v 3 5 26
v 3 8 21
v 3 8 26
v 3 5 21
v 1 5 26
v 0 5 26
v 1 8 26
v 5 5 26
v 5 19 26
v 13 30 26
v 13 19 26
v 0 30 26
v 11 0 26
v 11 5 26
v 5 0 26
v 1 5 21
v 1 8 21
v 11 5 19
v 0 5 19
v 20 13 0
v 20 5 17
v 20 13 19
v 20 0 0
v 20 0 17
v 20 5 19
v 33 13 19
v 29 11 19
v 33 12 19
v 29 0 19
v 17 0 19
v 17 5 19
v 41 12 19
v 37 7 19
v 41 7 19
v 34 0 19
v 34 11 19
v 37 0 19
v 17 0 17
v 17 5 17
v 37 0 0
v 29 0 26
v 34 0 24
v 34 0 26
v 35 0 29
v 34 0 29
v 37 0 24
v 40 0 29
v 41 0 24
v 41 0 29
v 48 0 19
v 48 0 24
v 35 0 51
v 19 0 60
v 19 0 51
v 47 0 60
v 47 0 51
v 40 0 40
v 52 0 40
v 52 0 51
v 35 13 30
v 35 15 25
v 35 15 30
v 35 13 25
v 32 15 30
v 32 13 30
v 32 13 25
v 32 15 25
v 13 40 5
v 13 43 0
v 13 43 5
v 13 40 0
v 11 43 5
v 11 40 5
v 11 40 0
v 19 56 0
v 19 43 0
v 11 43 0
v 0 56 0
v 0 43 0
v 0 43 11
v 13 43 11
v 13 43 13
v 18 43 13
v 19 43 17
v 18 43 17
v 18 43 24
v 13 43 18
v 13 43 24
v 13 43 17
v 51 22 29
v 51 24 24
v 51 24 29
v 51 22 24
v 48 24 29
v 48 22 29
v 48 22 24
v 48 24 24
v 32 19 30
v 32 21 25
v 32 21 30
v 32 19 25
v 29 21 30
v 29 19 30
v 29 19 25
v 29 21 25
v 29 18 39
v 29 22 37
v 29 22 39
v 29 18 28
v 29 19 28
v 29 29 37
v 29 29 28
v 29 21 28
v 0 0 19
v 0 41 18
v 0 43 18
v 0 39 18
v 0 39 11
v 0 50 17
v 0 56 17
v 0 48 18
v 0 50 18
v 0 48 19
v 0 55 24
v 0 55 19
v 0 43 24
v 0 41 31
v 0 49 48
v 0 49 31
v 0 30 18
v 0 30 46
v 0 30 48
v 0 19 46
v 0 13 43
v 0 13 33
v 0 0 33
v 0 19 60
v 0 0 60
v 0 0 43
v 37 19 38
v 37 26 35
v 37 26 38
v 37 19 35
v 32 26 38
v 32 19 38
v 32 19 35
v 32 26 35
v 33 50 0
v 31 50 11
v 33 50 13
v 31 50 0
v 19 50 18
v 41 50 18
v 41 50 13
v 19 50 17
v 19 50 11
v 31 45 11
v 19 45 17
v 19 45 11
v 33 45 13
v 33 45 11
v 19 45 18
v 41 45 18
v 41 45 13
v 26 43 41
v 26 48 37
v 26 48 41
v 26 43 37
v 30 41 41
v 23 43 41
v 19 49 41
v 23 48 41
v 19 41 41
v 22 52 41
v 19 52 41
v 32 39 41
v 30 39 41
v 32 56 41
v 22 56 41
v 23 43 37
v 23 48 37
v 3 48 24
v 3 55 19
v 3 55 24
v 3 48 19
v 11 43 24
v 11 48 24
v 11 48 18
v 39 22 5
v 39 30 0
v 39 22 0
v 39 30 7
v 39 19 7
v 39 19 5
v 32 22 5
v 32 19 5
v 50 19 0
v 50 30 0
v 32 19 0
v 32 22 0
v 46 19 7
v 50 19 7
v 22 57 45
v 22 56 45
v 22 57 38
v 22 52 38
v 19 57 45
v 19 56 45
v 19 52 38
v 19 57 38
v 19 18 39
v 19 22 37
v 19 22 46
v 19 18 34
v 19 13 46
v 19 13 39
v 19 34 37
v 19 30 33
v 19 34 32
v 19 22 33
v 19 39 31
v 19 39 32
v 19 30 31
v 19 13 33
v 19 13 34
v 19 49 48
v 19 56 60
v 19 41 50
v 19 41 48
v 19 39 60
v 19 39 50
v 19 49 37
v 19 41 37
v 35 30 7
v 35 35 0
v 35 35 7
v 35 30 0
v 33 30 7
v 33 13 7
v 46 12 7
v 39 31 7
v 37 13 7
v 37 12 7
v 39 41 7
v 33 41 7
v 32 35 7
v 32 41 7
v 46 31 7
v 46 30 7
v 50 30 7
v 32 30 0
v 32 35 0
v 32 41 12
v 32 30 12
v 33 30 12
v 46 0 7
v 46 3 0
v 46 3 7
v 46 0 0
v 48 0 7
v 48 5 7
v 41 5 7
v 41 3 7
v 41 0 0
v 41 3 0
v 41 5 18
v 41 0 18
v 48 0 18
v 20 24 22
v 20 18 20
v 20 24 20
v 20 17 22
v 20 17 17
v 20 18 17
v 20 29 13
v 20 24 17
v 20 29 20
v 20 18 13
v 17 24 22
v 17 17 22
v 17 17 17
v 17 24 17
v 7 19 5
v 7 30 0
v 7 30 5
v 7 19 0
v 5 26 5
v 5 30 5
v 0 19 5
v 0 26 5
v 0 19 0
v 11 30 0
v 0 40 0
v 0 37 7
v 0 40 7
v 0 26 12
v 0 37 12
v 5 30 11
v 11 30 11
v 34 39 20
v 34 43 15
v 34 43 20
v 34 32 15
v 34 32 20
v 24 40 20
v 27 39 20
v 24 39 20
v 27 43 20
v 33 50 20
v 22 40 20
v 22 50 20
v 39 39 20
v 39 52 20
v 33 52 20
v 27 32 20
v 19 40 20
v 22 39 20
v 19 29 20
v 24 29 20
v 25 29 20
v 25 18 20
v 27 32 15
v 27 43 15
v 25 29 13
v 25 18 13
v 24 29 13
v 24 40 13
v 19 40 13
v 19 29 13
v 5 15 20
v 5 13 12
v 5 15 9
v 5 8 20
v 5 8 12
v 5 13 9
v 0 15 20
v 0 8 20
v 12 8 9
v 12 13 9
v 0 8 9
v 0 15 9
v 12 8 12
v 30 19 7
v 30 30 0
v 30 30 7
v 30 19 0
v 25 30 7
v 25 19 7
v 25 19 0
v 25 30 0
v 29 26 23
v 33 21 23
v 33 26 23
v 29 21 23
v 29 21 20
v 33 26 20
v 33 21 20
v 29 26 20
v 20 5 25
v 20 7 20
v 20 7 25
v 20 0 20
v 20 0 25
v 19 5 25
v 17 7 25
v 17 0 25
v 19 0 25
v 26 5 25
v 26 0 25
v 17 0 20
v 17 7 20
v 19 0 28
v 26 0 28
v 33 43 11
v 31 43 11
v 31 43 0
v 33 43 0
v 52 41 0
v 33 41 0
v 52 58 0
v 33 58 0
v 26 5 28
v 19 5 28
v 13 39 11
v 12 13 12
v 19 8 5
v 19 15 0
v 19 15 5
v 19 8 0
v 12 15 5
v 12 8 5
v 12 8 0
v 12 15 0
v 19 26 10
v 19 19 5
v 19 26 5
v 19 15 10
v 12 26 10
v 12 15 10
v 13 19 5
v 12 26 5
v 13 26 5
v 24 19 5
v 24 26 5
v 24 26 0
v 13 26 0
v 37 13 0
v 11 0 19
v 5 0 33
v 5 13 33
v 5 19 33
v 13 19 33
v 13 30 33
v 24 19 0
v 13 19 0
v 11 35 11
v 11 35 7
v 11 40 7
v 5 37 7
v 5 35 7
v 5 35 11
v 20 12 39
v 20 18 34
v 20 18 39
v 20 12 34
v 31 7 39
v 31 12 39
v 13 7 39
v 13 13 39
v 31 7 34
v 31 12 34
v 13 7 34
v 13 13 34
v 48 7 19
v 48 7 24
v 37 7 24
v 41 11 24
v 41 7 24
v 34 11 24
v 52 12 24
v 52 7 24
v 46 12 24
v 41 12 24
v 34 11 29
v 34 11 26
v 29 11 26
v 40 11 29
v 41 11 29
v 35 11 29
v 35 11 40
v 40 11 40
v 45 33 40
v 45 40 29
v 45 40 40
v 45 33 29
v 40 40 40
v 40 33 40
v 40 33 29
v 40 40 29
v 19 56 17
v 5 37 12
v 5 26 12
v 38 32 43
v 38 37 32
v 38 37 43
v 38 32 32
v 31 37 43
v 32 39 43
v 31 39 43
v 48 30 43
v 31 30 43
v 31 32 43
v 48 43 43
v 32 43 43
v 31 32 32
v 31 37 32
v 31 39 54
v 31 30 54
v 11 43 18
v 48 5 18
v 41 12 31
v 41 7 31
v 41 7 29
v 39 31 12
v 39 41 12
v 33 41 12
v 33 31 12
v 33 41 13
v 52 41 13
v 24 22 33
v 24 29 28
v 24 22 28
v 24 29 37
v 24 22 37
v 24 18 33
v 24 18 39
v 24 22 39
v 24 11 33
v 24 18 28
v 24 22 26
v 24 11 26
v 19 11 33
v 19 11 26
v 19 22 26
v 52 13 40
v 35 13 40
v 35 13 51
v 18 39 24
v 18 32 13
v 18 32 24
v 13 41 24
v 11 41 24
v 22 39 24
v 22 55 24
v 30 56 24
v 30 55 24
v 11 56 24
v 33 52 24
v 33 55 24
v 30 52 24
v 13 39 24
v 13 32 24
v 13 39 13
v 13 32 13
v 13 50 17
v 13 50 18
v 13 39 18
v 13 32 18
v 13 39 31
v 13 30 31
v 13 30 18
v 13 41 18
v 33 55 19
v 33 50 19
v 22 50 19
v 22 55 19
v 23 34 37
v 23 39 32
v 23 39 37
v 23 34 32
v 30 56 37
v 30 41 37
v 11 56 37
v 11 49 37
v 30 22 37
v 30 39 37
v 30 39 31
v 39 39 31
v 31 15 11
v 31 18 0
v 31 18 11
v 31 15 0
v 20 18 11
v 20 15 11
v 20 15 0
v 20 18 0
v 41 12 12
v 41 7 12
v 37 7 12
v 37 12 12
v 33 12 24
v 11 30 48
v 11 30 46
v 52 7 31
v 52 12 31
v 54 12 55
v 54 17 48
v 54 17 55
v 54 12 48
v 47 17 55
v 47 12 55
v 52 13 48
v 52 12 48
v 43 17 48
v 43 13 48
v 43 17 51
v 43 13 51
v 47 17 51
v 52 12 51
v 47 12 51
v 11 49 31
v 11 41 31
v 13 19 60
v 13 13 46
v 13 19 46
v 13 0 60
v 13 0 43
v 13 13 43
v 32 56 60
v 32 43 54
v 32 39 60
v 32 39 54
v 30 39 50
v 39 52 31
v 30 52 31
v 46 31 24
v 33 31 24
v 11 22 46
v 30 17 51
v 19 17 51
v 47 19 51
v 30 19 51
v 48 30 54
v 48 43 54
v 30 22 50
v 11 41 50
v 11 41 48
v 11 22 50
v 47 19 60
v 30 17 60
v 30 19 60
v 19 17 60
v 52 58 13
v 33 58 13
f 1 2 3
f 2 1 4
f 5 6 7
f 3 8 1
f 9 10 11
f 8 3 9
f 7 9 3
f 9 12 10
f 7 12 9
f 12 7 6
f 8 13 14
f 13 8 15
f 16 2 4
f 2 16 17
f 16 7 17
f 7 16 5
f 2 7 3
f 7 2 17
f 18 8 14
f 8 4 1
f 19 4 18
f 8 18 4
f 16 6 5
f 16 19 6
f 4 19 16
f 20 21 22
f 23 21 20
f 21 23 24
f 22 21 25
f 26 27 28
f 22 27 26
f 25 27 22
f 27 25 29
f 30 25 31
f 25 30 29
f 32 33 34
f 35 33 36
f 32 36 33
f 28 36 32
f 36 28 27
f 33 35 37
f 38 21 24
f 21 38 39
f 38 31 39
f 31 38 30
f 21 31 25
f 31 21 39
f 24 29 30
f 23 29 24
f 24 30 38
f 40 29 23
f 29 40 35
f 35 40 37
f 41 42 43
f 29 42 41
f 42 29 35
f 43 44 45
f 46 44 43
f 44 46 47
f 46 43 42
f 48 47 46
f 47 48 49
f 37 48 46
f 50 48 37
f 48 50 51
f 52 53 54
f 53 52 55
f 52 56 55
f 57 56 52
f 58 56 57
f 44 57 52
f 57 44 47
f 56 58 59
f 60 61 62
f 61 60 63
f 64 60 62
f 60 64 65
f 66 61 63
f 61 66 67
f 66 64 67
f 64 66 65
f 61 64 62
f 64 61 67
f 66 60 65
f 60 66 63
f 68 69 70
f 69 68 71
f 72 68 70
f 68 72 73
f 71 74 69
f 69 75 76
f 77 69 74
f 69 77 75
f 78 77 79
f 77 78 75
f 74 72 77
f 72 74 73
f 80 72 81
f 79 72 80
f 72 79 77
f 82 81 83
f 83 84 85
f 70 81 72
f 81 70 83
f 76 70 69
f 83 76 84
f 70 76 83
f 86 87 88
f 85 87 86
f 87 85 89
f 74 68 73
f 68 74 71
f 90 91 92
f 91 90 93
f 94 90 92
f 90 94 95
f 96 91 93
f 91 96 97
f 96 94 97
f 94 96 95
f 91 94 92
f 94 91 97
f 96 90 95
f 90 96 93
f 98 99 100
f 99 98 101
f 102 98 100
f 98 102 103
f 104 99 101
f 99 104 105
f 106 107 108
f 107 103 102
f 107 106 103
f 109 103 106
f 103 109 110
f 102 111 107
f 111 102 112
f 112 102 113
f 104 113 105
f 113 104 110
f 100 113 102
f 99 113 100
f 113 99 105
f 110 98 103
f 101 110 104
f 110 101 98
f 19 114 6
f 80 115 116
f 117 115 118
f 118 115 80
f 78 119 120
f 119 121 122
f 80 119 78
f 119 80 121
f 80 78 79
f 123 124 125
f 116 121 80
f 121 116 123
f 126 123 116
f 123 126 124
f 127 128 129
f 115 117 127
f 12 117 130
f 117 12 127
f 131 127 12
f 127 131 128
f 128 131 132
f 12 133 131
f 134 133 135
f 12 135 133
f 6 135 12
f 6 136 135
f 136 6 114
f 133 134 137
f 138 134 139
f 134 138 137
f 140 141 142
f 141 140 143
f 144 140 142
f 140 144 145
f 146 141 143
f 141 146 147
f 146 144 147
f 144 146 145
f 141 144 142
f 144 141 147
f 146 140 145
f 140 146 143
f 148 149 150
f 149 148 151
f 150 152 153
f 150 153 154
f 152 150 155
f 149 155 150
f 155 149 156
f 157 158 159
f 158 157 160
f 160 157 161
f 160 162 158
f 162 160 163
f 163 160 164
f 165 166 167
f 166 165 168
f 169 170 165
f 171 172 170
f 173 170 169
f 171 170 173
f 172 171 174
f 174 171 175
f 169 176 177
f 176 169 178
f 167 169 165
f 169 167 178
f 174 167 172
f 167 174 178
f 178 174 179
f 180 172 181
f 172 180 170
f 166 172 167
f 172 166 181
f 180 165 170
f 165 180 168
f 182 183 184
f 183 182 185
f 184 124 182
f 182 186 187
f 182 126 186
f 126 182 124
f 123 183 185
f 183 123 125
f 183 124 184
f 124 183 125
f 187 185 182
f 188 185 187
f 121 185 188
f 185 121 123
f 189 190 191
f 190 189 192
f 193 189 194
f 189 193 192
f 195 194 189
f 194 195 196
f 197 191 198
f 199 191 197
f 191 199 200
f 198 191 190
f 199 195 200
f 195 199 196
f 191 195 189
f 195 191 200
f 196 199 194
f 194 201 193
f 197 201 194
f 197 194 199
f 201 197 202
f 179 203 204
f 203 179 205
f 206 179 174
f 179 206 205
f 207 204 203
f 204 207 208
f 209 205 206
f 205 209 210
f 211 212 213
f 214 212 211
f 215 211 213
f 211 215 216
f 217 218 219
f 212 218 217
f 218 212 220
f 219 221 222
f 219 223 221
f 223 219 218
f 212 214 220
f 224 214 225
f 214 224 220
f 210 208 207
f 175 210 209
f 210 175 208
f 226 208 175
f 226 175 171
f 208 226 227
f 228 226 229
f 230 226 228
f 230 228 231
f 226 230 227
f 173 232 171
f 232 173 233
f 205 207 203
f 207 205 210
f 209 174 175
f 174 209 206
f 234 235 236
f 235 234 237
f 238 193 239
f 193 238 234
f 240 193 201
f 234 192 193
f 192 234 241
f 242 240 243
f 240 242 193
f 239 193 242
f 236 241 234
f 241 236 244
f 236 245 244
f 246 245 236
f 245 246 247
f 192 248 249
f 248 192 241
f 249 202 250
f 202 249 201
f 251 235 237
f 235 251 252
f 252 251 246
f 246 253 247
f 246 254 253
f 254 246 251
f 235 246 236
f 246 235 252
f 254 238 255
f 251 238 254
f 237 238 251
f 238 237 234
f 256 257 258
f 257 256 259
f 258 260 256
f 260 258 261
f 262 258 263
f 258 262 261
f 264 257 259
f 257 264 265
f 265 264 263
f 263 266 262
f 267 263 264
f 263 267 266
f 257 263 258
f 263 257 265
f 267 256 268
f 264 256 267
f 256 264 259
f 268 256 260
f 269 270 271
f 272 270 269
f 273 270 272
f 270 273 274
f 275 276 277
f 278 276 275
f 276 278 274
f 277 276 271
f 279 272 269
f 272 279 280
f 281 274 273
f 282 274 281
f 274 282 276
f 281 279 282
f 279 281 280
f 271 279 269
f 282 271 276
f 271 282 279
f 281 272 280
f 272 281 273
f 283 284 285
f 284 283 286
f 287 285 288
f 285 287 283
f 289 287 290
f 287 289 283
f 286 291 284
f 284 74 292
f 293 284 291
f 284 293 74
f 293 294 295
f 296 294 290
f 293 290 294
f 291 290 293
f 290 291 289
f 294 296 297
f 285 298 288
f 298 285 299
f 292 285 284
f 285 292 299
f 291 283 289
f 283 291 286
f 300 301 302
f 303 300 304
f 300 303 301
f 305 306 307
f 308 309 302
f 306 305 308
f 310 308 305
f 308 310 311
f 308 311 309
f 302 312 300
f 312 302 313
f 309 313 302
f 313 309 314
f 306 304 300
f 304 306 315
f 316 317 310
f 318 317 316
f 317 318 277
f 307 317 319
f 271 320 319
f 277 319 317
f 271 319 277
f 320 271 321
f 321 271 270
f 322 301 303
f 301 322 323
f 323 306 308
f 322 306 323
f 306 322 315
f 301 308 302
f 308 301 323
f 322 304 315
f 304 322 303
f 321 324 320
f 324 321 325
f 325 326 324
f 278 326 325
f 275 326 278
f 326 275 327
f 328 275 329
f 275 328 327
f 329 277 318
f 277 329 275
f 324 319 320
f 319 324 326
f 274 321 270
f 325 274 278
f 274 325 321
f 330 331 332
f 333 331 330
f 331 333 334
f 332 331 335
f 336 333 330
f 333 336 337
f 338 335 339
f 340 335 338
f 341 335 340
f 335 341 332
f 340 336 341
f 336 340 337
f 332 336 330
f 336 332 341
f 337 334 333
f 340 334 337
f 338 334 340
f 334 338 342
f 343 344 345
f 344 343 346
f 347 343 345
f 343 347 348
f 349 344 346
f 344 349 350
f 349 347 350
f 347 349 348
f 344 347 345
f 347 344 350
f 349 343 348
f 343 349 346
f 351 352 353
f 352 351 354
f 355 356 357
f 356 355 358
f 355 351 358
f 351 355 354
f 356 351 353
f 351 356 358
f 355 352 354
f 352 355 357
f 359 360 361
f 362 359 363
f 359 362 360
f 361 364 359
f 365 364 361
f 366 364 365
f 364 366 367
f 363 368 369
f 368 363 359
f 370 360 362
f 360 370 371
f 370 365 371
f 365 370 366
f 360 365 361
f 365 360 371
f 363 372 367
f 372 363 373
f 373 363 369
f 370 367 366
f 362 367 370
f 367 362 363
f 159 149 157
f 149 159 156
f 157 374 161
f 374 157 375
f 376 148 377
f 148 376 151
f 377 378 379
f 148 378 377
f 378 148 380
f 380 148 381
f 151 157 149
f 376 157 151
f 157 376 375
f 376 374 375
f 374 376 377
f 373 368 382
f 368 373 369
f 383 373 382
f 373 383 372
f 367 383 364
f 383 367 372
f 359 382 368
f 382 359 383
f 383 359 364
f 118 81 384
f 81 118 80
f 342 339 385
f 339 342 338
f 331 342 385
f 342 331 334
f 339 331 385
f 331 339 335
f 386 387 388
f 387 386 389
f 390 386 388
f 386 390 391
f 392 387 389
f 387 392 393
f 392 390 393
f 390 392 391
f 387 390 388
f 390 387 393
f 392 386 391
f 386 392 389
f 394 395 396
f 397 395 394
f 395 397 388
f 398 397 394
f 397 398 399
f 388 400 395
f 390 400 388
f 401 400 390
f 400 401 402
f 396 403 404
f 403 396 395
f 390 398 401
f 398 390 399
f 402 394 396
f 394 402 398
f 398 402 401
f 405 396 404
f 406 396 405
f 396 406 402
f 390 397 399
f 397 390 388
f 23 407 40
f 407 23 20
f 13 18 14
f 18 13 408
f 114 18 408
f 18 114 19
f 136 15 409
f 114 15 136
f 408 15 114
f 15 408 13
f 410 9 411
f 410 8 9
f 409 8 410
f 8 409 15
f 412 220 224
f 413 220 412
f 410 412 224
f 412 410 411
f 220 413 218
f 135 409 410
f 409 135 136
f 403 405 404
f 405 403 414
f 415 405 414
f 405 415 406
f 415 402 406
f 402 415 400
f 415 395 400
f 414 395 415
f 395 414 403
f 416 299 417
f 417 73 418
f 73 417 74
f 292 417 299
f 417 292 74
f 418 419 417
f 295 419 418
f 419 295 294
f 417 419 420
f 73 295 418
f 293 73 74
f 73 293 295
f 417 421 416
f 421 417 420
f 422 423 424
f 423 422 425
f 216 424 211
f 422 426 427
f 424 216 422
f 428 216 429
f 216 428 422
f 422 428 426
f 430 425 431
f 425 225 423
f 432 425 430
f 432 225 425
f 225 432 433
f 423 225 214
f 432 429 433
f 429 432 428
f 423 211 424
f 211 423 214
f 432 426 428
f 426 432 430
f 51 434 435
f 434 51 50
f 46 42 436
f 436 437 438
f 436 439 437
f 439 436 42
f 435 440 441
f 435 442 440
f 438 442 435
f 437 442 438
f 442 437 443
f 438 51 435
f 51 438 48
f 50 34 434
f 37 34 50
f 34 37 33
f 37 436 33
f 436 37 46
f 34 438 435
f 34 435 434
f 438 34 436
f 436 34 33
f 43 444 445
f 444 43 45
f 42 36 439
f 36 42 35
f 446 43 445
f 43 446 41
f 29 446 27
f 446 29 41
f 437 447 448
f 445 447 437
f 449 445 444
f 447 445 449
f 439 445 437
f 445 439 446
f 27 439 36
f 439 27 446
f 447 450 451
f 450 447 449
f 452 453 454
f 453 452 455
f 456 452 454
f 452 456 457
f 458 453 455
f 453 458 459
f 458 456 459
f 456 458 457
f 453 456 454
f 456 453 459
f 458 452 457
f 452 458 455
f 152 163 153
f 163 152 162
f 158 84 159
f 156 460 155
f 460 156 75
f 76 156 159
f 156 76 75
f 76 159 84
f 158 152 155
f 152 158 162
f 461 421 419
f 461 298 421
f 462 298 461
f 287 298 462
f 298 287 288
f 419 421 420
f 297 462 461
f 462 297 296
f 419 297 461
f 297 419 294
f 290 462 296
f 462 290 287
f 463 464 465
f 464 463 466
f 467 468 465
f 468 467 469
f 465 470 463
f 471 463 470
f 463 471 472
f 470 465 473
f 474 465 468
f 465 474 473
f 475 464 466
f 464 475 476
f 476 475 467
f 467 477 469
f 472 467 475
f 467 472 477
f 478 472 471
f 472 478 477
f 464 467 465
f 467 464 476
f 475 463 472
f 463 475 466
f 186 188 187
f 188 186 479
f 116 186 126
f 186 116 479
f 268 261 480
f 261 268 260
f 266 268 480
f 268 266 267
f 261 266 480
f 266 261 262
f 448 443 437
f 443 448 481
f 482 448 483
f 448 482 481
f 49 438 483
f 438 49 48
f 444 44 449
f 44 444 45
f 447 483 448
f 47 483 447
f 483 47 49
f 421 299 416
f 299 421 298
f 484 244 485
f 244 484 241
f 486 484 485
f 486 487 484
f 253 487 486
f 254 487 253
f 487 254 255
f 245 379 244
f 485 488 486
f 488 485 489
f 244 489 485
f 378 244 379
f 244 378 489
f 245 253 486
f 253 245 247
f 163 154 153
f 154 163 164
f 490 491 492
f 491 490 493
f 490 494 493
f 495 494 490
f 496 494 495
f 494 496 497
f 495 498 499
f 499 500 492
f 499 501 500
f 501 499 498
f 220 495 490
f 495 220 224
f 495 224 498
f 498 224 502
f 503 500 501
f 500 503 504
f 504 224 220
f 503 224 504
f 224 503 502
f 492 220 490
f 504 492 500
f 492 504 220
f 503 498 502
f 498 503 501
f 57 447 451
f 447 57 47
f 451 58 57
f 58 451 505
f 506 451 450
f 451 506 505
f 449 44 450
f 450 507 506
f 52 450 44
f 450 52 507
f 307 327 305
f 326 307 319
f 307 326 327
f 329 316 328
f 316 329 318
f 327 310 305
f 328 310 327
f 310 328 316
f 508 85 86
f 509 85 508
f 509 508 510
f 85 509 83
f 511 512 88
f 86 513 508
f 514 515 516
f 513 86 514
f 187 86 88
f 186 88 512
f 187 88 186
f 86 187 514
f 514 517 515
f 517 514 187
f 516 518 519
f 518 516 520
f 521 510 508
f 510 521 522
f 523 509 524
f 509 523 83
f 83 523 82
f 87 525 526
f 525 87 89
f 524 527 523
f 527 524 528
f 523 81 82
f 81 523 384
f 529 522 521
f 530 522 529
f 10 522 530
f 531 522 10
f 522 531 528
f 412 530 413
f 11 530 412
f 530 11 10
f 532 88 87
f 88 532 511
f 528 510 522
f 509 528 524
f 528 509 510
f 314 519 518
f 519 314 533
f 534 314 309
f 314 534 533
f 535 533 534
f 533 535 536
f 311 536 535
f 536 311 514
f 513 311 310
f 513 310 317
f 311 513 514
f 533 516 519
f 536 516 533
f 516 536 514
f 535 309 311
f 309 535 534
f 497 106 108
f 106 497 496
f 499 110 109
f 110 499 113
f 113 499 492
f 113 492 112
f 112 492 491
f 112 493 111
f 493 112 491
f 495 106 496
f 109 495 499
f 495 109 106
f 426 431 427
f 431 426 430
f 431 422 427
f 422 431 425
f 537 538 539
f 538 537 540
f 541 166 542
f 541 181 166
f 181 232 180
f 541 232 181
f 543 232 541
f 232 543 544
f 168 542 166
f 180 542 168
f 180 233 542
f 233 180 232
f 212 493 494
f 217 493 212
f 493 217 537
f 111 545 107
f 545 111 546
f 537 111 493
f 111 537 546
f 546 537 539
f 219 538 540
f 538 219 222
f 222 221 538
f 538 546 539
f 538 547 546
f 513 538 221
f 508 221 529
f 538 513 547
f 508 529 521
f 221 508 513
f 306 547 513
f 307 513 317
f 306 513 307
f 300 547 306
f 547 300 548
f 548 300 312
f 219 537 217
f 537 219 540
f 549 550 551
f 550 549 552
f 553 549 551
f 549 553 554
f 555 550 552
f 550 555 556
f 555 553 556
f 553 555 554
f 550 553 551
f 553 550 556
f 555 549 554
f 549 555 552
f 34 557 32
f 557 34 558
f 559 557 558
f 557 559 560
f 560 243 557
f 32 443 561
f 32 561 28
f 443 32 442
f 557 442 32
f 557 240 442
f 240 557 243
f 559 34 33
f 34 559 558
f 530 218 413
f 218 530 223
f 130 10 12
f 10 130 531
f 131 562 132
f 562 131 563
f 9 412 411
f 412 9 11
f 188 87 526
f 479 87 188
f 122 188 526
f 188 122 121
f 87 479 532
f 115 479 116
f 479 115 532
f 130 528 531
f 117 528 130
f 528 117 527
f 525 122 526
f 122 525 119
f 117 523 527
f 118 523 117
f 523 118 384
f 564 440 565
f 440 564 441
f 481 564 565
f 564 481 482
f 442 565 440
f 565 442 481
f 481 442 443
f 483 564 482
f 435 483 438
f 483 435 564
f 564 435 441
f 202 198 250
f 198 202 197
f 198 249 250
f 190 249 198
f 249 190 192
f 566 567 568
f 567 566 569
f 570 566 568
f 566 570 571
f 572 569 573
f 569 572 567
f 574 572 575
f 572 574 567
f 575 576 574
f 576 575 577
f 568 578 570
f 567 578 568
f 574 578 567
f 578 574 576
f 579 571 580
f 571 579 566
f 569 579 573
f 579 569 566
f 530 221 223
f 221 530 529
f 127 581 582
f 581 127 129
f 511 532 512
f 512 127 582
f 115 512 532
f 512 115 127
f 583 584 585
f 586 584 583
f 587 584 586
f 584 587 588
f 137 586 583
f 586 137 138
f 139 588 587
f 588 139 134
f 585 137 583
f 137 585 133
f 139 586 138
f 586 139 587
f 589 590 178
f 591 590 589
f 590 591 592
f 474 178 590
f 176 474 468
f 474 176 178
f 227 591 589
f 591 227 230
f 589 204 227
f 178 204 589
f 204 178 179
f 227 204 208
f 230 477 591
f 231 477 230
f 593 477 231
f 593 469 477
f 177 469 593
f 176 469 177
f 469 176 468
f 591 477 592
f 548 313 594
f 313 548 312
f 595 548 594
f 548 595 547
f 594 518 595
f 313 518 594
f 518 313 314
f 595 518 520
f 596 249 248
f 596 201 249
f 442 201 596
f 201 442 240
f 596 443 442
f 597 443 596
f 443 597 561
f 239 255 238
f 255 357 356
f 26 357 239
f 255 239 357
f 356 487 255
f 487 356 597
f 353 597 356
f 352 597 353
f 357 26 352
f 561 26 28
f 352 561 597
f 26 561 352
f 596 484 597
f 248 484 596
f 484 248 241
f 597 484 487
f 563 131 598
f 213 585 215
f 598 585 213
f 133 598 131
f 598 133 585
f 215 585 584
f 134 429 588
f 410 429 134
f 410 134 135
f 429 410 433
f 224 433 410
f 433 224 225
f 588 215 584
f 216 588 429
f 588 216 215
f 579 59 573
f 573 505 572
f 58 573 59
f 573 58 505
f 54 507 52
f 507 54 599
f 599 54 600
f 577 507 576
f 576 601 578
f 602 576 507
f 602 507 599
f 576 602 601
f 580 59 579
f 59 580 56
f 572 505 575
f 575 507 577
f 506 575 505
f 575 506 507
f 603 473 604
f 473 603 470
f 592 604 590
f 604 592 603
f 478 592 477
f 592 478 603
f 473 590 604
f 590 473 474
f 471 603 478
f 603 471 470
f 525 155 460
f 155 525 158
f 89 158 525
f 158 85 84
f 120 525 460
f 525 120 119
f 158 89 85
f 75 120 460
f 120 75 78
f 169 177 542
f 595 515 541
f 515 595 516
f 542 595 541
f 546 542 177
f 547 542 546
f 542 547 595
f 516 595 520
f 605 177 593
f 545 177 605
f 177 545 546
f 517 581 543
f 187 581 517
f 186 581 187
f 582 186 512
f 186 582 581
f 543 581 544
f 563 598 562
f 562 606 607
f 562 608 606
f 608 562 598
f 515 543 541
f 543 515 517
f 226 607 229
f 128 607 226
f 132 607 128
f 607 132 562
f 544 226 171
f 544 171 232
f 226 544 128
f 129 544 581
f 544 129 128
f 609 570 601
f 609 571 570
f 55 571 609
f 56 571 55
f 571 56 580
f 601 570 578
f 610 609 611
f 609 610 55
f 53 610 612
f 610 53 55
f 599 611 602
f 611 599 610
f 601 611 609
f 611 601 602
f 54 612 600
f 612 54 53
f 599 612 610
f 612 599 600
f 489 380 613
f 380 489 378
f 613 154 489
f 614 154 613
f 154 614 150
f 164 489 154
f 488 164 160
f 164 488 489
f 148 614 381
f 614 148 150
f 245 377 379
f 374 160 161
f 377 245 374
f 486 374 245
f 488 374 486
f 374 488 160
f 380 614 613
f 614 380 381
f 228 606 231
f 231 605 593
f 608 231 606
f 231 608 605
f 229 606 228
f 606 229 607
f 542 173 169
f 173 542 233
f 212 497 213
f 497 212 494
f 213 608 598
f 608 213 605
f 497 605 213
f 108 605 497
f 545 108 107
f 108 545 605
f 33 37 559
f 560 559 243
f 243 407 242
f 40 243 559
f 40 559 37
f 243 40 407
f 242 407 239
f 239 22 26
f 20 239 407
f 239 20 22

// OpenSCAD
translate([2.0, 6.5, 23.5]) color([0.38726457915960755, 0.18022138882203653, 0.8001465394041192]) cube([2, 3, 5], center=true);
translate([18.5, 2.5, 18.0]) color([0.8129994204848935, 0.08072942167368968, 0.17442535469903642]) cube([3, 5, 2], center=true);
translate([33.5, 14.0, 27.5]) color([0.26558344961408153, 0.8002006207478382, 0.3279381595582189]) cube([3, 2, 5], center=true);
translate([12.0, 41.5, 2.5]) color([0.7086727191051987, 0.7823295314553788, 0.5174360046946651]) cube([2, 3, 5], center=true);
translate([27.5, 51.0, 50.5]) color([0.45647885649310815, 0.9099967640280606, 0.7566722996545016]) cube([5, 2, 3], center=true);
translate([49.5, 23.0, 26.5]) color([0.44882496858184395, 0.15281911968142636, 0.6325441046469116]) cube([3, 2, 5], center=true);
translate([30.5, 20.0, 27.5]) color([0.1769660088535372, 0.5122224095001495, 0.8959696721858674]) cube([3, 2, 5], center=true);
translate([3.5, 52.5, 1.5]) color([0.31608020378500323, 0.9467436825606468, 0.1928870204716916]) cube([7, 5, 3], center=true);
translate([34.5, 22.5, 36.5]) color([0.7910187054913302, 0.6108926701450443, 0.8122678209742187]) cube([5, 7, 3], center=true);
translate([40.5, 47.5, 8.5]) color([0.5222627979471512, 0.7095307583634994, 0.9126687247694082]) cube([3, 5, 7], center=true);
translate([24.5, 45.5, 37.5]) color([0.13487625477079712, 0.7715208720856912, 0.05716454642595936]) cube([3, 5, 7], center=true);
translate([1.5, 51.5, 21.5]) color([0.08241654053773162, 0.5176706786705761, 0.0024604932439482585]) cube([3, 7, 5], center=true);
translate([35.5, 20.5, 2.5]) color([0.774865046739482, 0.10398133417765076, 0.6075408633971222]) cube([7, 3, 5], center=true);
translate([20.5, 54.5, 41.5]) color([0.5702741924791085, 0.335807396721168, 0.3780654483467295]) cube([3, 5, 7], center=true);
translate([33.5, 32.5, 3.5]) color([0.36205489178930694, 0.8413126085807436, 0.6365683683667089]) cube([3, 5, 7], center=true);
translate([43.5, 1.5, 3.5]) color([0.13610848275491239, 0.9255182446742467, 0.18259927432055334]) cube([5, 3, 7], center=true);
translate([45.5, 10.5, 44.5]) color([0.12509989752770068, 0.33788945440902196, 0.607477949510089]) cube([5, 3, 7], center=true);
translate([18.5, 20.5, 19.5]) color([0.04413950751599882, 0.6453929548117466, 0.6988419541065013]) cube([3, 7, 5], center=true);
translate([3.5, 24.5, 2.5]) color([0.7967664255910738, 0.9116718921976609, 0.600448770579328]) cube([7, 11, 5], center=true);
translate([30.5, 37.5, 17.5]) color([0.7944487907838055, 0.1681613799771936, 0.9183995562433641]) cube([7, 11, 5], center=true);
translate([22.5, 23.5, 16.5]) color([0.9268586566852167, 0.40822611044352053, 0.4407066729290805]) cube([5, 11, 7], center=true);
translate([2.5, 11.5, 14.5]) color([0.6041418306666712, 0.6201352905963935, 0.25582819932935885]) cube([5, 7, 11], center=true);
translate([27.5, 24.5, 3.5]) color([0.3097428572381714, 0.8490920052212889, 0.453637908490201]) cube([5, 11, 7], center=true);
translate([32.5, 23.5, 21.5]) color([0.18066627555108494, 0.4537290543496928, 0.2641493990309046]) cube([7, 5, 3], center=true);
translate([18.5, 3.5, 22.5]) color([0.9492851375614021, 0.06409274308092405, 0.09630522223834415]) cube([3, 7, 5], center=true);
translate([33.5, 46.5, 5.5]) color([0.02618666999626429, 0.02133712304448243, 0.40376331371079255]) cube([5, 7, 11], center=true);
translate([22.5, 2.5, 26.5]) color([0.6905719463038024, 0.8969992176715027, 0.32280326974746465]) cube([7, 5, 3], center=true);
translate([3.5, 48.5, 5.5]) color([0.790755737975632, 0.7460115169857665, 0.6948475129606672]) cube([7, 7, 11], center=true);
translate([9.5, 39.5, 35.5]) color([0.47653257906772517, 0.8579766307154586, 0.5356136848189613]) cube([5, 11, 7], center=true);
translate([8.5, 10.5, 10.5]) color([0.4019331618452773, 0.783713898498177, 0.9254696984756191]) cube([7, 5, 3], center=true);
translate([15.5, 11.5, 2.5]) color([0.0277966234683793, 0.5158650286176655, 0.8365998776746773]) cube([7, 7, 5], center=true);
translate([15.5, 20.5, 7.5]) color([0.08009244005093674, 0.35854963179787425, 0.0984859129144442]) cube([7, 11, 5], center=true);
translate([26.5, 2.5, 5.5]) color([0.9681463616569913, 0.1542718478221884, 0.5165971564168642]) cube([7, 5, 11], center=true);
translate([5.5, 2.5, 22.5]) color([0.8047430089643692, 0.9598305824160865, 0.0007265089205383823]) cube([11, 5, 7], center=true);
translate([2.5, 5.5, 29.5]) color([0.33769105491683293, 0.9444140087685011, 0.6959768172121321]) cube([5, 11, 7], center=true);
translate([18.5, 22.5, 2.5]) color([0.16055826227824588, 0.7793255516951493, 0.1589752259859445]) cube([11, 7, 5], center=true);
translate([5.5, 37.5, 3.5]) color([0.6798370424105331, 0.9431536263145228, 0.9341404857092784]) cube([11, 5, 7], center=true);
translate([16.5, 12.5, 36.5]) color([0.32827049453258017, 0.023848105094706917, 0.9585798448912861]) cube([7, 11, 5], center=true);
translate([42.5, 3.5, 21.5]) color([0.6258377632382796, 0.3981042954636257, 0.2264255750200933]) cube([11, 7, 5], center=true);
translate([2.5, 16.5, 29.5]) color([0.6356717667101055, 0.328569085672622, 0.9662245753272395]) cube([5, 11, 7], center=true);
translate([31.5, 5.5, 22.5]) color([0.3520821722301851, 0.16362135021644642, 0.42074777530803376]) cube([5, 11, 7], center=true);
translate([42.5, 36.5, 34.5]) color([0.36328644213461747, 0.5653807754665455, 0.3865100485452896]) cube([5, 7, 11], center=true);
translate([24.5, 47.5, 14.5]) color([0.7707594112565195, 0.16214085318372695, 0.5836514905515098]) cube([11, 5, 7], center=true);
translate([2.5, 31.5, 8.5]) color([0.6869400768720183, 0.718467099976435, 0.17196229100139104]) cube([5, 11, 7], center=true);
translate([34.5, 34.5, 37.5]) color([0.14887881293527583, 0.025166107893626943, 0.32332346968418324]) cube([7, 5, 11], center=true);
translate([5.5, 45.5, 20.5]) color([0.003696799562737496, 0.04720529747843194, 0.9255571895234466]) cube([11, 5, 7], center=true);
translate([44.5, 2.5, 12.5]) color([0.573001262631075, 0.14769469781462263, 0.15315209085934545]) cube([7, 5, 11], center=true);
translate([5.5, 45.5, 35.5]) color([0.7868491215994531, 0.7877029182496789, 0.4187372508366701]) cube([11, 5, 5], center=true);
translate([37.5, 5.5, 26.5]) color([0.5680438273675328, 0.6864311496386182, 0.7112052310106062]) cube([7, 11, 5], center=true);
translate([5.5, 32.5, 5.5]) color([0.9225367392437966, 0.36402675889620517, 0.21666285047939615]) cube([11, 5, 11], center=true);
translate([35.5, 35.5, 9.5]) color([0.40038769746607716, 0.12979762559949215, 0.5661089096865166]) cube([7, 11, 5], center=true);
translate([35.5, 47.5, 14.5]) color([0.350592866287013, 0.09655676358596321, 0.8957043173613797]) cube([11, 5, 7], center=true);
translate([21.5, 16.5, 29.5]) color([0.24564542972396286, 0.3817592950540295, 0.9163373365613642]) cube([5, 11, 7], center=true);
translate([37.5, 5.5, 34.5]) color([0.24005472395766314, 0.4811830401201487, 0.9204180358452778]) cube([5, 11, 11], center=true);
translate([21.5, 34.5, 16.5]) color([0.06901768472479497, 0.25236871091997304, 0.2758752397078251]) cube([5, 11, 7], center=true);
translate([15.5, 37.5, 18.5]) color([0.526585946767007, 0.5423400552699501, 0.6040332809955223]) cube([5, 11, 11], center=true);
translate([27.5, 52.5, 21.5]) color([0.7795947303962014, 0.8767515811101877, 0.27628184885013174]) cube([11, 5, 5], center=true);
translate([26.5, 23.5, 33.5]) color([0.6109665581700968, 0.8673330381368943, 0.39077563557117434]) cube([5, 11, 11], center=true);
translate([25.5, 9.5, 36.5]) color([0.6261021875341246, 0.5344719952169016, 0.8525626141482417]) cube([11, 5, 5], center=true);
translate([17.5, 36.5, 34.5]) color([0.1442072370162294, 0.39242938925918713, 0.7677442686337953]) cube([11, 5, 5], center=true);
translate([25.5, 16.5, 5.5]) color([0.7310024639236243, 0.976490023680837, 0.432956620488795]) cube([11, 3, 11], center=true);
translate([35.5, 9.5, 15.5]) color([0.10481875176128097, 0.4606863677813431, 0.461987586031698]) cube([11, 5, 7], center=true);
translate([6.5, 24.5, 29.5]) color([0.16960878923904732, 0.4743590683571708, 0.15900931947085895]) cube([13, 11, 7], center=true);
translate([6.5, 44.5, 14.5]) color([0.9184122383299332, 0.8645912802495788, 0.7618309073415613]) cube([13, 11, 7], center=true);
translate([46.5, 9.5, 27.5]) color([0.1125156501937501, 0.36828247715101237, 0.14269334546182144]) cube([11, 5, 7], center=true);
translate([44.5, 24.5, 3.5]) color([0.3576212954978014, 0.47267833076618404, 0.5187172796832821]) cube([11, 11, 7], center=true);
translate([48.5, 14.5, 51.5]) color([0.05390524264941354, 0.8771386739413267, 0.25763233882857706]) cube([11, 5, 7], center=true);
translate([6.5, 35.5, 24.5]) color([0.7234564765071956, 0.3246711887124375, 0.3801134723009394]) cube([13, 11, 13], center=true);
translate([6.5, 9.5, 51.5]) color([0.04146251299314507, 0.5514350789130729, 0.03490092368589748]) cube([13, 19, 17], center=true);
translate([25.5, 47.5, 50.5]) color([0.4105469306488987, 0.3751623833766272, 0.20817480494735885]) cube([13, 17, 19], center=true);
translate([30.5, 45.5, 25.5]) color([0.13416269520041413, 0.11029894361740877, 0.3569637027811857]) cube([17, 13, 11], center=true);
translate([39.5, 21.5, 15.5]) color([0.03122581862343432, 0.5766961902260587, 0.46351932045943167]) cube([13, 19, 17], center=true);
translate([9.5, 21.5, 39.5]) color([0.6418946885374921, 0.7070356211127606, 0.07782501561786981]) cube([19, 17, 13], center=true);
translate([43.5, 6.5, 45.5]) color([0.42542790282452947, 0.7262099352025745, 0.1383007479401901]) cube([17, 13, 11], center=true);
translate([39.5, 36.5, 48.5]) color([0.15296819960671582, 0.16447153857536234, 0.02972250823157674]) cube([17, 13, 11], center=true);
translate([9.5, 49.5, 8.5]) color([0.13555611535148748, 0.49304209170471214, 0.8998582652350663]) cube([19, 13, 17], center=true);
translate([20.5, 47.5, 30.5]) color([0.6233506257524957, 0.28803948846792526, 0.7932252536354372]) cube([19, 17, 13], center=true);
translate([9.5, 39.5, 39.5]) color([0.6841926136499455, 0.8025617596714979, 0.9141286153689818]) cube([19, 19, 17], center=true);
translate([38.5, 9.5, 55.5]) color([0.8380916000073253, 0.7734206085146829, 0.26176851167691584]) cube([17, 19, 9], center=true);
translate([28.5, 8.5, 55.5]) color([0.15831969188506612, 0.6279762350139132, 0.968532274155243]) cube([19, 17, 9], center=true);
translate([42.5, 49.5, 6.5]) color([0.5331314108905011, 0.14458049768334114, 0.3761389701406963]) cube([19, 17, 13], center=true);
translate([20.5, 31.5, 43.5]) color([0.7397992144806613, 0.5554788507911738, 0.2345364606417215]) cube([19, 19, 13], center=true);
translate([28.5, 6.5, 9.5]) color([0.9148239194796951, 0.37856658806298793, 0.39026506951982043]) cube([17, 13, 19], center=true);
